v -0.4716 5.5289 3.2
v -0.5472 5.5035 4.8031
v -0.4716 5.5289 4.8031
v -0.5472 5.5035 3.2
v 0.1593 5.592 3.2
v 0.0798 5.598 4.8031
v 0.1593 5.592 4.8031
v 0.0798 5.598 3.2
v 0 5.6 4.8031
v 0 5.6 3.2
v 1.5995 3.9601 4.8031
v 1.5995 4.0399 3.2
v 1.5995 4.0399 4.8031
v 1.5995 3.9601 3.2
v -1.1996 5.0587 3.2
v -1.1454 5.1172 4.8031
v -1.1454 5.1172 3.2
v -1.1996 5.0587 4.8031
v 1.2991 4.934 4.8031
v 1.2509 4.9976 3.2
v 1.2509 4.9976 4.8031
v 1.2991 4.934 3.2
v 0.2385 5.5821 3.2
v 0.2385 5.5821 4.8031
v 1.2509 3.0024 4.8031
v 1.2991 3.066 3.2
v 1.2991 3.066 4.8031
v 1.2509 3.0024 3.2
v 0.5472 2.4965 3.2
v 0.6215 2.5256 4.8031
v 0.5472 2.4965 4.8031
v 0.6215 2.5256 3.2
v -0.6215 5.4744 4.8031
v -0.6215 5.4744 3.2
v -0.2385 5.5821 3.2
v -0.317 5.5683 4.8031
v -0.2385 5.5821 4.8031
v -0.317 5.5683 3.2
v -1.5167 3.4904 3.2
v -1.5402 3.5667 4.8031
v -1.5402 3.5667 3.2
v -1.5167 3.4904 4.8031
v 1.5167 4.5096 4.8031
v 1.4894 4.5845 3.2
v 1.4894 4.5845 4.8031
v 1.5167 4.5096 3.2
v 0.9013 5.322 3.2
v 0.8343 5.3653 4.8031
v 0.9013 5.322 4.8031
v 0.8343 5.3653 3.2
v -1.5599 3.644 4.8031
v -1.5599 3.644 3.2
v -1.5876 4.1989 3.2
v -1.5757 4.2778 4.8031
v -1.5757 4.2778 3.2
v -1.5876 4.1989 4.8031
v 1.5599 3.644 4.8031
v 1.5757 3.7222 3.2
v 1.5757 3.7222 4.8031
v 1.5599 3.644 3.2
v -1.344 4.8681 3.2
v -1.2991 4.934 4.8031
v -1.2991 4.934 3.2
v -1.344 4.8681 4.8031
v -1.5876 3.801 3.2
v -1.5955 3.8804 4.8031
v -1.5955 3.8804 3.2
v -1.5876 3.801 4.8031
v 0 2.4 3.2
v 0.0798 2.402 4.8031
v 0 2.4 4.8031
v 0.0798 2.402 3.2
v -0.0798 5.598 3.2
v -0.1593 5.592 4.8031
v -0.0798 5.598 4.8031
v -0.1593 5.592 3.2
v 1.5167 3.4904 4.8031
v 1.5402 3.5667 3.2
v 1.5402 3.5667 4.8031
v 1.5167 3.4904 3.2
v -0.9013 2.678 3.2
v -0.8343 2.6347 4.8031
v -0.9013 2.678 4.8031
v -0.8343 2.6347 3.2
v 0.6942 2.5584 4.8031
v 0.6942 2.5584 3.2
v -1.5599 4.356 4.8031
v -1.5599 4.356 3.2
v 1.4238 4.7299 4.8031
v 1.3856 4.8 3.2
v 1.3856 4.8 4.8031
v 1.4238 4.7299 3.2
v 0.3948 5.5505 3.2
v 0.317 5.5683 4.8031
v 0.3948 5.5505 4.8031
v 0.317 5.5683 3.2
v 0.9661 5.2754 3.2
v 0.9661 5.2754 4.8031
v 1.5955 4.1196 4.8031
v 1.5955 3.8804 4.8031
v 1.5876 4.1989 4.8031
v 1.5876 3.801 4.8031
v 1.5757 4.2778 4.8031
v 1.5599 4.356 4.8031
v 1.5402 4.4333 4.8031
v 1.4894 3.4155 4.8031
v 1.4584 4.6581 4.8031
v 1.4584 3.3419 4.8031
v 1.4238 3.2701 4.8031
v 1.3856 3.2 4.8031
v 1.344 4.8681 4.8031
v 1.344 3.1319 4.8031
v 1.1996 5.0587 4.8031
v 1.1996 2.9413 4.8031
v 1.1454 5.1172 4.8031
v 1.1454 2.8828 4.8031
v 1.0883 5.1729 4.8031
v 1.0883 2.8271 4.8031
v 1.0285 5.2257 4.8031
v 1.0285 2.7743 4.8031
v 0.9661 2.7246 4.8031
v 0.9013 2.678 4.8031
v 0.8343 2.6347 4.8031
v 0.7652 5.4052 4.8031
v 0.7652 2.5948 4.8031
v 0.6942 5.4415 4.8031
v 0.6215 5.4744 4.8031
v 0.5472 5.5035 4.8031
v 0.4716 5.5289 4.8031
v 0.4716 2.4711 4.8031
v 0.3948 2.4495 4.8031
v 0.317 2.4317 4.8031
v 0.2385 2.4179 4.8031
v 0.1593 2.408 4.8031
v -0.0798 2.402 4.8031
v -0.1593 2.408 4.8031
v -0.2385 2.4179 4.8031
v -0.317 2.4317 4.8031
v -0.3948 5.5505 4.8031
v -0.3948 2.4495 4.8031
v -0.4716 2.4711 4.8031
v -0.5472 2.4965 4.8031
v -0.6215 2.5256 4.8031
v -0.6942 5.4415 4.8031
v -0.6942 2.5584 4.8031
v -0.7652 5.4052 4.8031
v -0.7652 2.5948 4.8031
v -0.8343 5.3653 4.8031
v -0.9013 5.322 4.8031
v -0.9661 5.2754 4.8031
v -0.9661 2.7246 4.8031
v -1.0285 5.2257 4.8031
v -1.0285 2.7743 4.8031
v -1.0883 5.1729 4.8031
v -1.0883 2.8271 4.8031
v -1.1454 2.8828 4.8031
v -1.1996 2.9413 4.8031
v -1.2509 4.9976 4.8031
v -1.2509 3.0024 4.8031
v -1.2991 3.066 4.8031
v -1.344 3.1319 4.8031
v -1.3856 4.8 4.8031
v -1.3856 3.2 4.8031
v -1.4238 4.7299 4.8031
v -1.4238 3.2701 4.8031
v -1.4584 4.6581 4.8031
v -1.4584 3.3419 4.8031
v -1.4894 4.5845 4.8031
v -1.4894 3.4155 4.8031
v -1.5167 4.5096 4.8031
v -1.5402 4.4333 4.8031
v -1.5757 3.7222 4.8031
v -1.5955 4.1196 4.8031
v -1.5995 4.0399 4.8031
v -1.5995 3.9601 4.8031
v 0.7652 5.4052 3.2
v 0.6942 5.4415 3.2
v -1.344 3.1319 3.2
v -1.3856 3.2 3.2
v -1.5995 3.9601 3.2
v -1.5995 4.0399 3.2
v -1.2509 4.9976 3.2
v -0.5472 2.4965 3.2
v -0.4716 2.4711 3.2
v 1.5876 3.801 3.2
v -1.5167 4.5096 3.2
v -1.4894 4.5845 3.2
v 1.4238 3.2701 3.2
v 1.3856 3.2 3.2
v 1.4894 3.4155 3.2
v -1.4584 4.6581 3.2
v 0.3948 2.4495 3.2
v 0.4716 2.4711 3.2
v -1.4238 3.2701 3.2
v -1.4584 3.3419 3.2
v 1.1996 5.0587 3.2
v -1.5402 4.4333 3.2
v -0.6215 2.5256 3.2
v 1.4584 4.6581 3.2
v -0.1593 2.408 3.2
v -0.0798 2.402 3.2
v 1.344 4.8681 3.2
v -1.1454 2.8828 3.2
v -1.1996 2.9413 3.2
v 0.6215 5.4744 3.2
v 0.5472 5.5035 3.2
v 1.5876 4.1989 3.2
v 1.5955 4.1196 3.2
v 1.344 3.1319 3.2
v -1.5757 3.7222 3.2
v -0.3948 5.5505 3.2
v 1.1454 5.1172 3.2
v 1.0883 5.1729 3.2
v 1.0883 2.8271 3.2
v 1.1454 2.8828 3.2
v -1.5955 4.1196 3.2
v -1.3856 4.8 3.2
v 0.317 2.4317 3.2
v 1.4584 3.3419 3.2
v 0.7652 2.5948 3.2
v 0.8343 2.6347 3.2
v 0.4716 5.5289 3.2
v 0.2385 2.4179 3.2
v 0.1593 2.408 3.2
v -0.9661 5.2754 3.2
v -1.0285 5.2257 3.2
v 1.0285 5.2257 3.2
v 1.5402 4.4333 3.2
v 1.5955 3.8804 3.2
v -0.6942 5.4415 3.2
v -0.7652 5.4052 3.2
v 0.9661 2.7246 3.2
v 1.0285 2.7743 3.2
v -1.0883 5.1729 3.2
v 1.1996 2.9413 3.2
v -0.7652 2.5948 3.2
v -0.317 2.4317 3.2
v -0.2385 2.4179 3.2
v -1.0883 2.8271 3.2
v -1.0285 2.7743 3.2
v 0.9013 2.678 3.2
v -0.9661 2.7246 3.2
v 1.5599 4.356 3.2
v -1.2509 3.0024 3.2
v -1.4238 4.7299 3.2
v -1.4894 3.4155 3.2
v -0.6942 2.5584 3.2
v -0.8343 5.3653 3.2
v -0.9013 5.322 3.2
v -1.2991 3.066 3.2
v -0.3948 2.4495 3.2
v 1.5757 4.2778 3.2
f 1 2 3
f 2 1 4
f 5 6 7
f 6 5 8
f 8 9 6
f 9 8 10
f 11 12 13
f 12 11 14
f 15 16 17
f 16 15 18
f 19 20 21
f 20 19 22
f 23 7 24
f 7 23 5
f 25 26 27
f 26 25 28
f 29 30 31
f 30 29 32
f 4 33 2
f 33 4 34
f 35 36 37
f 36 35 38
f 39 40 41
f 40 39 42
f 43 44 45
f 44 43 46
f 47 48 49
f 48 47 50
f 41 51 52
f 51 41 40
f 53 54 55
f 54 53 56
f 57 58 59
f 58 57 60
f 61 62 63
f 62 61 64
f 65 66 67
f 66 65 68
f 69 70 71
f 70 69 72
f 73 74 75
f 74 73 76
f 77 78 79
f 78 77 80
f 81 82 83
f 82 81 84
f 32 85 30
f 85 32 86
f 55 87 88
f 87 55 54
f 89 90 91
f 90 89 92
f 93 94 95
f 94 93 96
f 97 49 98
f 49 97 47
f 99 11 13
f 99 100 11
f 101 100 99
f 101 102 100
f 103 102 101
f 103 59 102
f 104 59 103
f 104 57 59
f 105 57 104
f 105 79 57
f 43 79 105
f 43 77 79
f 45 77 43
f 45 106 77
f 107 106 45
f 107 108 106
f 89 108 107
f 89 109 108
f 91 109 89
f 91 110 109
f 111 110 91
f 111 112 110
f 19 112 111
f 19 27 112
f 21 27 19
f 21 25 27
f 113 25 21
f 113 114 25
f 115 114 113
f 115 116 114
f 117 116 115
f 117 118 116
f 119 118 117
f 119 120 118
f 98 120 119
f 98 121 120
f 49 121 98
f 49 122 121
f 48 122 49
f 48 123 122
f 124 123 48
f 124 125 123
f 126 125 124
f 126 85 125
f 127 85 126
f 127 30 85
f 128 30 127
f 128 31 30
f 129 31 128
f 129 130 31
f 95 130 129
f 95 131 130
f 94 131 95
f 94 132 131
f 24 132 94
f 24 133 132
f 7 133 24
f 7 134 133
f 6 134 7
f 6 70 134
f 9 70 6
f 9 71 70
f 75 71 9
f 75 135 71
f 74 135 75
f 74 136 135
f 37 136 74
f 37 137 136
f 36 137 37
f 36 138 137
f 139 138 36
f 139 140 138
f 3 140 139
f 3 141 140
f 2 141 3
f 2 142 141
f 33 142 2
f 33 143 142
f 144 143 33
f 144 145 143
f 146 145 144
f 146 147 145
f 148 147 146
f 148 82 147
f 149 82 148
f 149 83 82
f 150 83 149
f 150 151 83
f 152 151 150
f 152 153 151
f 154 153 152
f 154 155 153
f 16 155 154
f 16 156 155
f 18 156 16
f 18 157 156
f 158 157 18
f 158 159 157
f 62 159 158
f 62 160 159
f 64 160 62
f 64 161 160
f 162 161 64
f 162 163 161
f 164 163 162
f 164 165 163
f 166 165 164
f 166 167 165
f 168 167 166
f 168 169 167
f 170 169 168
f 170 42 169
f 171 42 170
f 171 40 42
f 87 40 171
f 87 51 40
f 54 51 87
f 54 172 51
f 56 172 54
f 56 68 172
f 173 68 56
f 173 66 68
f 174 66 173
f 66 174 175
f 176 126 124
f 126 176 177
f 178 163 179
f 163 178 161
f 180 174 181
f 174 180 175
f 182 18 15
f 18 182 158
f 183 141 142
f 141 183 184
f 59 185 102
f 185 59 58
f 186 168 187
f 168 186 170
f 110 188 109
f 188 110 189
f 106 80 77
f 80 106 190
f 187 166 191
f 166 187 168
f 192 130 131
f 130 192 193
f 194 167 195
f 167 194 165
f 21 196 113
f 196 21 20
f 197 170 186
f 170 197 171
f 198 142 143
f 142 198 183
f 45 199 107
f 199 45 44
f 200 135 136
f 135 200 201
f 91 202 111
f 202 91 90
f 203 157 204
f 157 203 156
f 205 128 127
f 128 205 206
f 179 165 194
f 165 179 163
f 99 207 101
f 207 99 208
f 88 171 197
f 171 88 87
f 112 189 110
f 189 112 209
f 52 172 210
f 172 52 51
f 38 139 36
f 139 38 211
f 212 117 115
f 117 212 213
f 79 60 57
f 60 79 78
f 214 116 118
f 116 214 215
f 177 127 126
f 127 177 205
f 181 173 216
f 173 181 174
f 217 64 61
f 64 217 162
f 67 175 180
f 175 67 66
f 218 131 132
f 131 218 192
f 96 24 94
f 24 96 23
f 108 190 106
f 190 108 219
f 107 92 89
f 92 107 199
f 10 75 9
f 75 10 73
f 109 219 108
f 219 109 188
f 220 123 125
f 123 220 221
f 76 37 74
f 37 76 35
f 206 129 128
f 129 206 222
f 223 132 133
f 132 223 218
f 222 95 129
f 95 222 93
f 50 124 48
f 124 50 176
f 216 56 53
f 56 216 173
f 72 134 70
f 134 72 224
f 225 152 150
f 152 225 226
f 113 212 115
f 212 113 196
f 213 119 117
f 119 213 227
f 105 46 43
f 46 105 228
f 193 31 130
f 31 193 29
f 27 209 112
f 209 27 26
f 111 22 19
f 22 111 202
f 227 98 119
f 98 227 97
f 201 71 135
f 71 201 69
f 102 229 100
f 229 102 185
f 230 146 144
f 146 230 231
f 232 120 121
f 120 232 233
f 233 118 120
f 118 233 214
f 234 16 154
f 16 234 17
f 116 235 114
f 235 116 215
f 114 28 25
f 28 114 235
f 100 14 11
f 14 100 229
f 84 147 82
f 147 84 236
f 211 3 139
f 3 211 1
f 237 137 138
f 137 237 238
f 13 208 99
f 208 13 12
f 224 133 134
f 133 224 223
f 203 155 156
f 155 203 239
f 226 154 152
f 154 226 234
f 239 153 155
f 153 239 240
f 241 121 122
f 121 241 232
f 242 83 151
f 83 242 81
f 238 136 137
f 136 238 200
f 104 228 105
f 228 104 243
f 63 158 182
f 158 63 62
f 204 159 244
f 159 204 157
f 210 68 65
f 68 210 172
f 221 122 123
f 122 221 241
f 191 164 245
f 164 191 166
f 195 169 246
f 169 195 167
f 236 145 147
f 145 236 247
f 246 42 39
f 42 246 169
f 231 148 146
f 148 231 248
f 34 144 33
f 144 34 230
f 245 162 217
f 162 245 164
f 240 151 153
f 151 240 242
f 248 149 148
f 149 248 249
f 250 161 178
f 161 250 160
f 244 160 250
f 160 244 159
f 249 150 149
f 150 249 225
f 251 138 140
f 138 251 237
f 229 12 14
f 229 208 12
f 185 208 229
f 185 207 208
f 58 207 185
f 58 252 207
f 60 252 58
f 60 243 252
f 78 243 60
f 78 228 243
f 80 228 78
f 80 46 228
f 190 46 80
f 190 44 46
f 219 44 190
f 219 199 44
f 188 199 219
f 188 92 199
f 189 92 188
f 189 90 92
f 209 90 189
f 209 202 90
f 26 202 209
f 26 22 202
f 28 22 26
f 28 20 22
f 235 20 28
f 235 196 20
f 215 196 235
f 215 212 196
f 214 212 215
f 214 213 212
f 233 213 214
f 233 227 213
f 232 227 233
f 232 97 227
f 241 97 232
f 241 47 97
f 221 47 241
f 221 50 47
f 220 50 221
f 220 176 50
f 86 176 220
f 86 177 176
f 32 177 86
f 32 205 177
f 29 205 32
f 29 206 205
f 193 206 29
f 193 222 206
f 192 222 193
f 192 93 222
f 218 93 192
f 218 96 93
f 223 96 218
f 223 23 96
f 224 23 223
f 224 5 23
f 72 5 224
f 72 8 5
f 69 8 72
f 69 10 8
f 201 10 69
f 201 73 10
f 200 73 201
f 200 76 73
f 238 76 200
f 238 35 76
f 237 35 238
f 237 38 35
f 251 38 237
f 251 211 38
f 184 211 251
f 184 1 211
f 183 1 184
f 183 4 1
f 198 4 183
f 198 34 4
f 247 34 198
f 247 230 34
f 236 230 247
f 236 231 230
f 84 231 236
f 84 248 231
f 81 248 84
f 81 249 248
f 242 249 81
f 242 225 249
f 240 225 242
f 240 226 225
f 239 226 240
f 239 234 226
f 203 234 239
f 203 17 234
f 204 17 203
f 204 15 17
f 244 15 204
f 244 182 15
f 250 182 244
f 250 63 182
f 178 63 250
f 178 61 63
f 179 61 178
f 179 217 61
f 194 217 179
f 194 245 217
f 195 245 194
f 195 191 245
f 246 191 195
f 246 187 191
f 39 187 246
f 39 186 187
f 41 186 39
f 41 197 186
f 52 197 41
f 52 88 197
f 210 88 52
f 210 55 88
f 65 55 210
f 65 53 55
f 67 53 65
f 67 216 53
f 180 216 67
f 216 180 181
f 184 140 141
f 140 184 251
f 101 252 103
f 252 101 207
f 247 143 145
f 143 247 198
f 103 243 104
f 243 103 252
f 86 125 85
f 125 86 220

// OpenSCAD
use <../lib.scad>
use <../p/48/1-16cyli.scad>
use <s/15068s01.scad>
$fa=1; $fs=0.2;
function ldraw_lib__15068pz1(realsolid=false) = [
// 0 Slope Brick Curved  2 x  2 x  0.667 with Metallic Silver and White Hole Pattern
// 0 Name: 15068pz1.dat
// 0 Author: Damien Roux [Darats]
// 0 !LDRAW_ORG Part UPDATE 2019-02
// 0 !LICENSE Licensed under CC BY 2.0 and CC BY 4.0 : see CAreadme.txt
// 
// 0 BFC CERTIFY CCW
  [0,"BFC","CERTIFY"],
  [0,"BFC","CCW"],
// 
// 0 !KEYWORDS Boba Fett, Brickheadz, Set 41498
// 
// 0 !HISTORY 2019-09-09 [PTadmin] Official Update 2019-02
// 
// 
// 1 16 0 0 0 1 0 0 0 1 0 0 0 1 s\15068s01.dat
  [1,16,0,0,0,1,0,0,0,1,0,0,0,1, ldraw_lib__s__15068s01(realsolid)],
// 1 16 20 24.972 20 0 -40 0 -40.972 0 0 0 0 -56.568 48\1-16cyli.dat
  [1,16,20,24.972,20,0,-40,0,-40.972,0,0,0,0,-56.568, ldraw_lib__48__1_16cyli(realsolid)],
// 4 15 -12.447 -11.7637 -4.7764 -12.7813 -11.248 -6.2188 -9.7031 -11.6559 -5.0781 -10.7162 -12.0601 -3.9476
  [4,15,-12.447,-11.7637,-4.7764,-12.7813,-11.248,-6.2188,-9.7031,-11.6559,-5.0781,-10.7162,-12.0601,-3.9476],
// 3 15 -10.0625 -7.94017 -13.5938 -8.625 -8.27282 -12.9063 -11.4688 -8.40896 -12.625
  [3,15,-10.0625,-7.94017,-13.5938,-8.625,-8.27282,-12.9063,-11.4688,-8.40896,-12.625],
// 4 15 -14.2188 -8.96843 -11.4688 -12.5313 -8.52993 -12.375 -11.4688 -8.40896 -12.625 -8.625 -8.27282 -12.9063
  [4,15,-14.2188,-8.96843,-11.4688,-12.5313,-8.52993,-12.375,-11.4688,-8.40896,-12.625,-8.625,-8.27282,-12.9063],
// 3 15 -9.7031 -11.6559 -5.0781 -6.2812 -11.6223 -5.1719 -7.7812 -11.7564 -4.7969
  [3,15,-9.7031,-11.6559,-5.0781,-6.2812,-11.6223,-5.1719,-7.7812,-11.7564,-4.7969],
// 4 15 -6.1875 -8.60547 -12.2188 -14.2188 -8.96843 -11.4688 -8.625 -8.27282 -12.9063 -7.3125 -8.18209 -13.0938
  [4,15,-6.1875,-8.60547,-12.2188,-14.2188,-8.96843,-11.4688,-8.625,-8.27282,-12.9063,-7.3125,-8.18209,-13.0938],
// 4 15 -6.1875 -9.19522 -11 -14.1412 -9.77022 -9.8118 -14.2188 -8.96843 -11.4688 -6.1875 -8.60547 -12.2188
  [4,15,-6.1875,-9.19522,-11,-14.1412,-9.77022,-9.8118,-14.2188,-8.96843,-11.4688,-6.1875,-8.60547,-12.2188],
// 4 15 -14.6823 -11.0233 -6.847 -5.8281 -10.5775 -8.0938 -5.7812 -11.0692 -6.7188 -12.7813 -11.248 -6.2188
  [4,15,-14.6823,-11.0233,-6.847,-5.8281,-10.5775,-8.0938,-5.7812,-11.0692,-6.7188,-12.7813,-11.248,-6.2188],
// 4 15 -12.7813 -11.248 -6.2188 -5.7812 -11.0692 -6.7188 -6.2812 -11.6223 -5.1719 -9.7031 -11.6559 -5.0781
  [4,15,-12.7813,-11.248,-6.2188,-5.7812,-11.0692,-6.7188,-6.2812,-11.6223,-5.1719,-9.7031,-11.6559,-5.0781],
// 4 15 -14.7707 -10.5094 -8.28414 -5.73077 -10.5095 -8.28413 -5.8281 -10.5775 -8.0938 -14.6823 -11.0233 -6.847
  [4,15,-14.7707,-10.5094,-8.28414,-5.73077,-10.5095,-8.28413,-5.8281,-10.5775,-8.0938,-14.6823,-11.0233,-6.847],
// 4 15 -5.125 -9.93619 -9.4688 -14.8118 -10.1858 -8.9529 -14.1412 -9.77022 -9.8118 -6.1875 -9.19522 -11
  [4,15,-5.125,-9.93619,-9.4688,-14.8118,-10.1858,-8.9529,-14.1412,-9.77022,-9.8118,-6.1875,-9.19522,-11],
// 4 15 -14.8118 -10.1858 -8.9529 -5.125 -9.93619 -9.4688 -5.73077 -10.5095 -8.28413 -14.7707 -10.5094 -8.28414
  [4,15,-14.8118,-10.1858,-8.9529,-5.125,-9.93619,-9.4688,-5.73077,-10.5095,-8.28413,-14.7707,-10.5094,-8.28414],
// 4 16 -20 -7.53256 -14.4363 -16.3438 -9.95585 -9.4282 -16.2735 -10.5094 -8.28414 -20 -10.5094 -8.28411
  [4,16,-20,-7.53256,-14.4363,-16.3438,-9.95585,-9.4282,-16.2735,-10.5094,-8.28414,-20,-10.5094,-8.28411],
// 4 16 -16.1172 -11.4186 -5.7415 -19.9988 -12.8823 -1.64817 -20 -10.5094 -8.28411 -16.2735 -10.5094 -8.28414
  [4,16,-16.1172,-11.4186,-5.7415,-19.9988,-12.8823,-1.64817,-20,-10.5094,-8.28411,-16.2735,-10.5094,-8.28414],
// 4 16 -16.3438 -9.95585 -9.4282 -20 -7.53256 -14.4363 -15.7613 -8.54544 -12.343 -15.6655 -9.53555 -10.2968
  [4,16,-16.3438,-9.95585,-9.4282,-20,-7.53256,-14.4363,-15.7613,-8.54544,-12.343,-15.6655,-9.53555,-10.2968],
// 4 16 -13.7455 -12.1361 -3.7351 -19.9988 -12.8823 -1.64817 -16.1172 -11.4186 -5.7415 -14.0523 -11.6627 -5.059
  [4,16,-13.7455,-12.1361,-3.7351,-19.9988,-12.8823,-1.64817,-16.1172,-11.4186,-5.7415,-14.0523,-11.6627,-5.059],
// 3 16 -13.067 -7.8453 -13.7899 -15.7613 -8.54544 -12.343 -20 -7.53256 -14.4363
  [3,16,-13.067,-7.8453,-13.7899,-15.7613,-8.54544,-12.343,-20,-7.53256,-14.4363],
// 4 16 -12.0872 -7.73376 -14.0204 -13.067 -7.8453 -13.7899 -20 -7.53256 -14.4363 -11.4832 -7.53243 -14.4365
  [4,16,-12.0872,-7.73376,-14.0204,-13.067,-7.8453,-13.7899,-20,-7.53256,-14.4363,-11.4832,-7.53243,-14.4365],
// 3 16 -10.3497 -12.7176 -2.1089 -19.9988 -12.8823 -1.64817 -13.7455 -12.1361 -3.7351
  [3,16,-10.3497,-12.7176,-2.1089,-19.9988,-12.8823,-1.64817,-13.7455,-12.1361,-3.7351],
// 4 16 -20 -3.99979 -20 -10.1985 -6.97057 -15.3215 -11.4832 -7.53243 -14.4365 -20 -7.53256 -14.4363
  [4,16,-20,-3.99979,-20,-10.1985,-6.97057,-15.3215,-11.4832,-7.53243,-14.4365,-20,-7.53256,-14.4363],
// 3 16 -9.1235 -12.2283 -3.4773 -7.7051 -12.3025 -3.2697 -10.3497 -12.7176 -2.1089
  [3,16,-9.1235,-12.2283,-3.4773,-7.7051,-12.3025,-3.2697,-10.3497,-12.7176,-2.1089],
// 3 16 -6.8942 -7.38503 -14.6687 -8.38613 -7.53233 -14.4366 -10.1985 -6.97057 -15.3215
  [3,16,-6.8942,-7.38503,-14.6687,-8.38613,-7.53233,-14.4366,-10.1985,-6.97057,-15.3215],
// 3 16 -4.6875 -8.25049 -12.9524 -3.3804 -9.87962 -9.5857 -4.6875 -8.96808 -11.4694
  [3,16,-4.6875,-8.25049,-12.9524,-3.3804,-9.87962,-9.5857,-4.6875,-8.96808,-11.4694],
// 3 16 -19.9988 -12.8823 -1.64817 -10.3497 -12.7176 -2.1089 19.9957 -12.8824 -1.64813
  [3,16,-19.9988,-12.8823,-1.64817,-10.3497,-12.7176,-2.1089,19.9957,-12.8824,-1.64813],
// 4 16 19.9957 -12.8824 -1.64813 -10.3497 -12.7176 -2.1089 -7.7051 -12.3025 -3.2697 -5.1099 -12.0705 -3.9185
  [4,16,19.9957,-12.8824,-1.64813,-10.3497,-12.7176,-2.1089,-7.7051,-12.3025,-3.2697,-5.1099,-12.0705,-3.9185],
// 3 16 -4.04598 -10.5095 -8.28413 -3.3804 -9.87962 -9.5857 19.9983 -10.5095 -8.28413
  [3,16,-4.04598,-10.5095,-8.28413,-3.3804,-9.87962,-9.5857,19.9983,-10.5095,-8.28413],
// 4 16 -4.3157 -10.6981 -7.7567 -4.04598 -10.5095 -8.28413 19.9983 -10.5095 -8.28413 -4.2731 -11.1448 -6.5073
  [4,16,-4.3157,-10.6981,-7.7567,-4.04598,-10.5095,-8.28413,19.9983,-10.5095,-8.28413,-4.2731,-11.1448,-6.5073],
// 4 16 19.9957 -12.8824 -1.64813 -5.1099 -12.0705 -3.9185 -4.2731 -11.1448 -6.5073 19.9983 -10.5095 -8.28413
  [4,16,19.9957,-12.8824,-1.64813,-5.1099,-12.0705,-3.9185,-4.2731,-11.1448,-6.5073,19.9983,-10.5095,-8.28413],
// 4 16 -10.1985 -6.97057 -15.3215 -20 -3.99979 -20 20 -3.9998 -20 -6.8942 -7.38503 -14.6687
  [4,16,-10.1985,-6.97057,-15.3215,-20,-3.99979,-20,20,-3.9998,-20,-6.8942,-7.38503,-14.6687],
// 4 16 -6.8942 -7.38503 -14.6687 20 -3.9998 -20 20 -7.53232 -14.4363 -6.59559 -7.53241 -14.4365
  [4,16,-6.8942,-7.38503,-14.6687,20,-3.9998,-20,20,-7.53232,-14.4363,-6.59559,-7.53241,-14.4365],
// 3 16 20 -7.53232 -14.4363 -4.6875 -8.25049 -12.9524 -6.59559 -7.53241 -14.4365
  [3,16,20,-7.53232,-14.4363,-4.6875,-8.25049,-12.9524,-6.59559,-7.53241,-14.4365],
// 4 16 19.9983 -10.5095 -8.28413 -3.3804 -9.87962 -9.5857 -4.6875 -8.25049 -12.9524 20 -7.53232 -14.4363
  [4,16,19.9983,-10.5095,-8.28413,-3.3804,-9.87962,-9.5857,-4.6875,-8.25049,-12.9524,20,-7.53232,-14.4363],
// 4 80 -16.3438 -9.95585 -9.4282 -14.8118 -10.1858 -8.9529 -14.7707 -10.5094 -8.28414 -16.2735 -10.5094 -8.28414
  [4,80,-16.3438,-9.95585,-9.4282,-14.8118,-10.1858,-8.9529,-14.7707,-10.5094,-8.28414,-16.2735,-10.5094,-8.28414],
// 4 80 -16.2735 -10.5094 -8.28414 -14.7707 -10.5094 -8.28414 -14.6823 -11.0233 -6.847 -16.1172 -11.4186 -5.7415
  [4,80,-16.2735,-10.5094,-8.28414,-14.7707,-10.5094,-8.28414,-14.6823,-11.0233,-6.847,-16.1172,-11.4186,-5.7415],
// 4 80 -14.1412 -9.77022 -9.8118 -15.6655 -9.53555 -10.2968 -15.7613 -8.54544 -12.343 -14.2188 -8.96843 -11.4688
  [4,80,-14.1412,-9.77022,-9.8118,-15.6655,-9.53555,-10.2968,-15.7613,-8.54544,-12.343,-14.2188,-8.96843,-11.4688],
// 4 80 -14.8118 -10.1858 -8.9529 -16.3438 -9.95585 -9.4282 -15.6655 -9.53555 -10.2968 -14.1412 -9.77022 -9.8118
  [4,80,-14.8118,-10.1858,-8.9529,-16.3438,-9.95585,-9.4282,-15.6655,-9.53555,-10.2968,-14.1412,-9.77022,-9.8118],
// 4 80 -16.1172 -11.4186 -5.7415 -14.6823 -11.0233 -6.847 -12.7813 -11.248 -6.2188 -14.0523 -11.6627 -5.059
  [4,80,-16.1172,-11.4186,-5.7415,-14.6823,-11.0233,-6.847,-12.7813,-11.248,-6.2188,-14.0523,-11.6627,-5.059],
// 4 80 -14.2188 -8.96843 -11.4688 -15.7613 -8.54544 -12.343 -13.067 -7.8453 -13.7899 -12.5313 -8.52993 -12.375
  [4,80,-14.2188,-8.96843,-11.4688,-15.7613,-8.54544,-12.343,-13.067,-7.8453,-13.7899,-12.5313,-8.52993,-12.375],
// 4 80 -14.0523 -11.6627 -5.059 -12.7813 -11.248 -6.2188 -12.447 -11.7637 -4.7764 -13.7455 -12.1361 -3.7351
  [4,80,-14.0523,-11.6627,-5.059,-12.7813,-11.248,-6.2188,-12.447,-11.7637,-4.7764,-13.7455,-12.1361,-3.7351],
// 4 80 -12.5313 -8.52993 -12.375 -13.067 -7.8453 -13.7899 -12.0872 -7.73376 -14.0204 -11.4688 -8.40896 -12.625
  [4,80,-12.5313,-8.52993,-12.375,-13.067,-7.8453,-13.7899,-12.0872,-7.73376,-14.0204,-11.4688,-8.40896,-12.625],
// 4 80 -13.7455 -12.1361 -3.7351 -12.447 -11.7637 -4.7764 -10.7162 -12.0601 -3.9476 -10.3497 -12.7176 -2.1089
  [4,80,-13.7455,-12.1361,-3.7351,-12.447,-11.7637,-4.7764,-10.7162,-12.0601,-3.9476,-10.3497,-12.7176,-2.1089],
// 4 80 -11.4688 -8.40896 -12.625 -12.0872 -7.73376 -14.0204 -11.4832 -7.53243 -14.4365 -10.0625 -7.94017 -13.5938
  [4,80,-11.4688,-8.40896,-12.625,-12.0872,-7.73376,-14.0204,-11.4832,-7.53243,-14.4365,-10.0625,-7.94017,-13.5938],
// 4 80 -10.3497 -12.7176 -2.1089 -10.7162 -12.0601 -3.9476 -9.7031 -11.6559 -5.0781 -9.1235 -12.2283 -3.4773
  [4,80,-10.3497,-12.7176,-2.1089,-10.7162,-12.0601,-3.9476,-9.7031,-11.6559,-5.0781,-9.1235,-12.2283,-3.4773],
// 3 80 -8.38613 -7.53233 -14.4366 -11.4832 -7.53243 -14.4365 -10.1985 -6.97057 -15.3215
  [3,80,-8.38613,-7.53233,-14.4366,-11.4832,-7.53243,-14.4365,-10.1985,-6.97057,-15.3215],
// 4 80 -10.0625 -7.94017 -13.5938 -11.4832 -7.53243 -14.4365 -8.38613 -7.53233 -14.4366 -8.625 -8.27282 -12.9063
  [4,80,-10.0625,-7.94017,-13.5938,-11.4832,-7.53243,-14.4365,-8.38613,-7.53233,-14.4366,-8.625,-8.27282,-12.9063],
// 4 80 -9.1235 -12.2283 -3.4773 -9.7031 -11.6559 -5.0781 -7.7812 -11.7564 -4.7969 -7.7051 -12.3025 -3.2697
  [4,80,-9.1235,-12.2283,-3.4773,-9.7031,-11.6559,-5.0781,-7.7812,-11.7564,-4.7969,-7.7051,-12.3025,-3.2697],
// 3 80 -6.59559 -7.53241 -14.4365 -8.38613 -7.53233 -14.4366 -6.8942 -7.38503 -14.6687
  [3,80,-6.59559,-7.53241,-14.4365,-8.38613,-7.53233,-14.4366,-6.8942,-7.38503,-14.6687],
// 4 80 -8.625 -8.27282 -12.9063 -8.38613 -7.53233 -14.4366 -6.59559 -7.53241 -14.4365 -7.3125 -8.18209 -13.0938
  [4,80,-8.625,-8.27282,-12.9063,-8.38613,-7.53233,-14.4366,-6.59559,-7.53241,-14.4365,-7.3125,-8.18209,-13.0938],
// 4 80 -7.7051 -12.3025 -3.2697 -7.7812 -11.7564 -4.7969 -6.2812 -11.6223 -5.1719 -5.1099 -12.0705 -3.9185
  [4,80,-7.7051,-12.3025,-3.2697,-7.7812,-11.7564,-4.7969,-6.2812,-11.6223,-5.1719,-5.1099,-12.0705,-3.9185],
// 4 80 -7.3125 -8.18209 -13.0938 -6.59559 -7.53241 -14.4365 -4.6875 -8.25049 -12.9524 -6.1875 -8.60547 -12.2188
  [4,80,-7.3125,-8.18209,-13.0938,-6.59559,-7.53241,-14.4365,-4.6875,-8.25049,-12.9524,-6.1875,-8.60547,-12.2188],
// 4 80 -6.1875 -8.60547 -12.2188 -4.6875 -8.25049 -12.9524 -4.6875 -8.96808 -11.4694 -6.1875 -9.19522 -11
  [4,80,-6.1875,-8.60547,-12.2188,-4.6875,-8.25049,-12.9524,-4.6875,-8.96808,-11.4694,-6.1875,-9.19522,-11],
// 4 80 -4.2731 -11.1448 -6.5073 -5.7812 -11.0692 -6.7188 -5.8281 -10.5775 -8.0938 -4.3157 -10.6981 -7.7567
  [4,80,-4.2731,-11.1448,-6.5073,-5.7812,-11.0692,-6.7188,-5.8281,-10.5775,-8.0938,-4.3157,-10.6981,-7.7567],
// 4 80 -5.1099 -12.0705 -3.9185 -6.2812 -11.6223 -5.1719 -5.7812 -11.0692 -6.7188 -4.2731 -11.1448 -6.5073
  [4,80,-5.1099,-12.0705,-3.9185,-6.2812,-11.6223,-5.1719,-5.7812,-11.0692,-6.7188,-4.2731,-11.1448,-6.5073],
// 4 80 -4.3157 -10.6981 -7.7567 -5.8281 -10.5775 -8.0938 -5.73077 -10.5095 -8.28413 -4.04598 -10.5095 -8.28413
  [4,80,-4.3157,-10.6981,-7.7567,-5.8281,-10.5775,-8.0938,-5.73077,-10.5095,-8.28413,-4.04598,-10.5095,-8.28413],
// 4 80 -6.1875 -9.19522 -11 -4.6875 -8.96808 -11.4694 -3.3804 -9.87962 -9.5857 -5.125 -9.93619 -9.4688
  [4,80,-6.1875,-9.19522,-11,-4.6875,-8.96808,-11.4694,-3.3804,-9.87962,-9.5857,-5.125,-9.93619,-9.4688],
// 4 80 -5.73077 -10.5095 -8.28413 -5.125 -9.93619 -9.4688 -3.3804 -9.87962 -9.5857 -4.04598 -10.5095 -8.28413
  [4,80,-5.73077,-10.5095,-8.28413,-5.125,-9.93619,-9.4688,-3.3804,-9.87962,-9.5857,-4.04598,-10.5095,-8.28413],
// 
// 5 24 20 -7.531575 -14.436 -20 -7.531575 -14.436 20 -10.509886 -8.284 20 -3.9999 -20
  [5,24,20,-7.531575,-14.436,-20,-7.531575,-14.436,20,-10.509886,-8.284,20,-3.9999,-20],
// 5 24 20 -10.509886 -8.284 -20 -10.509886 -8.284 20 -12.882685 -1.648 20 -7.531575 -14.436
  [5,24,20,-10.509886,-8.284,-20,-10.509886,-8.284,20,-12.882685,-1.648,20,-7.531575,-14.436],
];
module ldraw_lib__15068pz1(step=0, col=false, unit=2/5, alt=false, line=0.2, solid=!$preview)
    makepoly(ldraw_lib__15068pz1(solid), step=step, col=col, unit=unit, alt=alt, line=line, solid=solid);
ldraw_lib__15068pz1(line=0.2);
